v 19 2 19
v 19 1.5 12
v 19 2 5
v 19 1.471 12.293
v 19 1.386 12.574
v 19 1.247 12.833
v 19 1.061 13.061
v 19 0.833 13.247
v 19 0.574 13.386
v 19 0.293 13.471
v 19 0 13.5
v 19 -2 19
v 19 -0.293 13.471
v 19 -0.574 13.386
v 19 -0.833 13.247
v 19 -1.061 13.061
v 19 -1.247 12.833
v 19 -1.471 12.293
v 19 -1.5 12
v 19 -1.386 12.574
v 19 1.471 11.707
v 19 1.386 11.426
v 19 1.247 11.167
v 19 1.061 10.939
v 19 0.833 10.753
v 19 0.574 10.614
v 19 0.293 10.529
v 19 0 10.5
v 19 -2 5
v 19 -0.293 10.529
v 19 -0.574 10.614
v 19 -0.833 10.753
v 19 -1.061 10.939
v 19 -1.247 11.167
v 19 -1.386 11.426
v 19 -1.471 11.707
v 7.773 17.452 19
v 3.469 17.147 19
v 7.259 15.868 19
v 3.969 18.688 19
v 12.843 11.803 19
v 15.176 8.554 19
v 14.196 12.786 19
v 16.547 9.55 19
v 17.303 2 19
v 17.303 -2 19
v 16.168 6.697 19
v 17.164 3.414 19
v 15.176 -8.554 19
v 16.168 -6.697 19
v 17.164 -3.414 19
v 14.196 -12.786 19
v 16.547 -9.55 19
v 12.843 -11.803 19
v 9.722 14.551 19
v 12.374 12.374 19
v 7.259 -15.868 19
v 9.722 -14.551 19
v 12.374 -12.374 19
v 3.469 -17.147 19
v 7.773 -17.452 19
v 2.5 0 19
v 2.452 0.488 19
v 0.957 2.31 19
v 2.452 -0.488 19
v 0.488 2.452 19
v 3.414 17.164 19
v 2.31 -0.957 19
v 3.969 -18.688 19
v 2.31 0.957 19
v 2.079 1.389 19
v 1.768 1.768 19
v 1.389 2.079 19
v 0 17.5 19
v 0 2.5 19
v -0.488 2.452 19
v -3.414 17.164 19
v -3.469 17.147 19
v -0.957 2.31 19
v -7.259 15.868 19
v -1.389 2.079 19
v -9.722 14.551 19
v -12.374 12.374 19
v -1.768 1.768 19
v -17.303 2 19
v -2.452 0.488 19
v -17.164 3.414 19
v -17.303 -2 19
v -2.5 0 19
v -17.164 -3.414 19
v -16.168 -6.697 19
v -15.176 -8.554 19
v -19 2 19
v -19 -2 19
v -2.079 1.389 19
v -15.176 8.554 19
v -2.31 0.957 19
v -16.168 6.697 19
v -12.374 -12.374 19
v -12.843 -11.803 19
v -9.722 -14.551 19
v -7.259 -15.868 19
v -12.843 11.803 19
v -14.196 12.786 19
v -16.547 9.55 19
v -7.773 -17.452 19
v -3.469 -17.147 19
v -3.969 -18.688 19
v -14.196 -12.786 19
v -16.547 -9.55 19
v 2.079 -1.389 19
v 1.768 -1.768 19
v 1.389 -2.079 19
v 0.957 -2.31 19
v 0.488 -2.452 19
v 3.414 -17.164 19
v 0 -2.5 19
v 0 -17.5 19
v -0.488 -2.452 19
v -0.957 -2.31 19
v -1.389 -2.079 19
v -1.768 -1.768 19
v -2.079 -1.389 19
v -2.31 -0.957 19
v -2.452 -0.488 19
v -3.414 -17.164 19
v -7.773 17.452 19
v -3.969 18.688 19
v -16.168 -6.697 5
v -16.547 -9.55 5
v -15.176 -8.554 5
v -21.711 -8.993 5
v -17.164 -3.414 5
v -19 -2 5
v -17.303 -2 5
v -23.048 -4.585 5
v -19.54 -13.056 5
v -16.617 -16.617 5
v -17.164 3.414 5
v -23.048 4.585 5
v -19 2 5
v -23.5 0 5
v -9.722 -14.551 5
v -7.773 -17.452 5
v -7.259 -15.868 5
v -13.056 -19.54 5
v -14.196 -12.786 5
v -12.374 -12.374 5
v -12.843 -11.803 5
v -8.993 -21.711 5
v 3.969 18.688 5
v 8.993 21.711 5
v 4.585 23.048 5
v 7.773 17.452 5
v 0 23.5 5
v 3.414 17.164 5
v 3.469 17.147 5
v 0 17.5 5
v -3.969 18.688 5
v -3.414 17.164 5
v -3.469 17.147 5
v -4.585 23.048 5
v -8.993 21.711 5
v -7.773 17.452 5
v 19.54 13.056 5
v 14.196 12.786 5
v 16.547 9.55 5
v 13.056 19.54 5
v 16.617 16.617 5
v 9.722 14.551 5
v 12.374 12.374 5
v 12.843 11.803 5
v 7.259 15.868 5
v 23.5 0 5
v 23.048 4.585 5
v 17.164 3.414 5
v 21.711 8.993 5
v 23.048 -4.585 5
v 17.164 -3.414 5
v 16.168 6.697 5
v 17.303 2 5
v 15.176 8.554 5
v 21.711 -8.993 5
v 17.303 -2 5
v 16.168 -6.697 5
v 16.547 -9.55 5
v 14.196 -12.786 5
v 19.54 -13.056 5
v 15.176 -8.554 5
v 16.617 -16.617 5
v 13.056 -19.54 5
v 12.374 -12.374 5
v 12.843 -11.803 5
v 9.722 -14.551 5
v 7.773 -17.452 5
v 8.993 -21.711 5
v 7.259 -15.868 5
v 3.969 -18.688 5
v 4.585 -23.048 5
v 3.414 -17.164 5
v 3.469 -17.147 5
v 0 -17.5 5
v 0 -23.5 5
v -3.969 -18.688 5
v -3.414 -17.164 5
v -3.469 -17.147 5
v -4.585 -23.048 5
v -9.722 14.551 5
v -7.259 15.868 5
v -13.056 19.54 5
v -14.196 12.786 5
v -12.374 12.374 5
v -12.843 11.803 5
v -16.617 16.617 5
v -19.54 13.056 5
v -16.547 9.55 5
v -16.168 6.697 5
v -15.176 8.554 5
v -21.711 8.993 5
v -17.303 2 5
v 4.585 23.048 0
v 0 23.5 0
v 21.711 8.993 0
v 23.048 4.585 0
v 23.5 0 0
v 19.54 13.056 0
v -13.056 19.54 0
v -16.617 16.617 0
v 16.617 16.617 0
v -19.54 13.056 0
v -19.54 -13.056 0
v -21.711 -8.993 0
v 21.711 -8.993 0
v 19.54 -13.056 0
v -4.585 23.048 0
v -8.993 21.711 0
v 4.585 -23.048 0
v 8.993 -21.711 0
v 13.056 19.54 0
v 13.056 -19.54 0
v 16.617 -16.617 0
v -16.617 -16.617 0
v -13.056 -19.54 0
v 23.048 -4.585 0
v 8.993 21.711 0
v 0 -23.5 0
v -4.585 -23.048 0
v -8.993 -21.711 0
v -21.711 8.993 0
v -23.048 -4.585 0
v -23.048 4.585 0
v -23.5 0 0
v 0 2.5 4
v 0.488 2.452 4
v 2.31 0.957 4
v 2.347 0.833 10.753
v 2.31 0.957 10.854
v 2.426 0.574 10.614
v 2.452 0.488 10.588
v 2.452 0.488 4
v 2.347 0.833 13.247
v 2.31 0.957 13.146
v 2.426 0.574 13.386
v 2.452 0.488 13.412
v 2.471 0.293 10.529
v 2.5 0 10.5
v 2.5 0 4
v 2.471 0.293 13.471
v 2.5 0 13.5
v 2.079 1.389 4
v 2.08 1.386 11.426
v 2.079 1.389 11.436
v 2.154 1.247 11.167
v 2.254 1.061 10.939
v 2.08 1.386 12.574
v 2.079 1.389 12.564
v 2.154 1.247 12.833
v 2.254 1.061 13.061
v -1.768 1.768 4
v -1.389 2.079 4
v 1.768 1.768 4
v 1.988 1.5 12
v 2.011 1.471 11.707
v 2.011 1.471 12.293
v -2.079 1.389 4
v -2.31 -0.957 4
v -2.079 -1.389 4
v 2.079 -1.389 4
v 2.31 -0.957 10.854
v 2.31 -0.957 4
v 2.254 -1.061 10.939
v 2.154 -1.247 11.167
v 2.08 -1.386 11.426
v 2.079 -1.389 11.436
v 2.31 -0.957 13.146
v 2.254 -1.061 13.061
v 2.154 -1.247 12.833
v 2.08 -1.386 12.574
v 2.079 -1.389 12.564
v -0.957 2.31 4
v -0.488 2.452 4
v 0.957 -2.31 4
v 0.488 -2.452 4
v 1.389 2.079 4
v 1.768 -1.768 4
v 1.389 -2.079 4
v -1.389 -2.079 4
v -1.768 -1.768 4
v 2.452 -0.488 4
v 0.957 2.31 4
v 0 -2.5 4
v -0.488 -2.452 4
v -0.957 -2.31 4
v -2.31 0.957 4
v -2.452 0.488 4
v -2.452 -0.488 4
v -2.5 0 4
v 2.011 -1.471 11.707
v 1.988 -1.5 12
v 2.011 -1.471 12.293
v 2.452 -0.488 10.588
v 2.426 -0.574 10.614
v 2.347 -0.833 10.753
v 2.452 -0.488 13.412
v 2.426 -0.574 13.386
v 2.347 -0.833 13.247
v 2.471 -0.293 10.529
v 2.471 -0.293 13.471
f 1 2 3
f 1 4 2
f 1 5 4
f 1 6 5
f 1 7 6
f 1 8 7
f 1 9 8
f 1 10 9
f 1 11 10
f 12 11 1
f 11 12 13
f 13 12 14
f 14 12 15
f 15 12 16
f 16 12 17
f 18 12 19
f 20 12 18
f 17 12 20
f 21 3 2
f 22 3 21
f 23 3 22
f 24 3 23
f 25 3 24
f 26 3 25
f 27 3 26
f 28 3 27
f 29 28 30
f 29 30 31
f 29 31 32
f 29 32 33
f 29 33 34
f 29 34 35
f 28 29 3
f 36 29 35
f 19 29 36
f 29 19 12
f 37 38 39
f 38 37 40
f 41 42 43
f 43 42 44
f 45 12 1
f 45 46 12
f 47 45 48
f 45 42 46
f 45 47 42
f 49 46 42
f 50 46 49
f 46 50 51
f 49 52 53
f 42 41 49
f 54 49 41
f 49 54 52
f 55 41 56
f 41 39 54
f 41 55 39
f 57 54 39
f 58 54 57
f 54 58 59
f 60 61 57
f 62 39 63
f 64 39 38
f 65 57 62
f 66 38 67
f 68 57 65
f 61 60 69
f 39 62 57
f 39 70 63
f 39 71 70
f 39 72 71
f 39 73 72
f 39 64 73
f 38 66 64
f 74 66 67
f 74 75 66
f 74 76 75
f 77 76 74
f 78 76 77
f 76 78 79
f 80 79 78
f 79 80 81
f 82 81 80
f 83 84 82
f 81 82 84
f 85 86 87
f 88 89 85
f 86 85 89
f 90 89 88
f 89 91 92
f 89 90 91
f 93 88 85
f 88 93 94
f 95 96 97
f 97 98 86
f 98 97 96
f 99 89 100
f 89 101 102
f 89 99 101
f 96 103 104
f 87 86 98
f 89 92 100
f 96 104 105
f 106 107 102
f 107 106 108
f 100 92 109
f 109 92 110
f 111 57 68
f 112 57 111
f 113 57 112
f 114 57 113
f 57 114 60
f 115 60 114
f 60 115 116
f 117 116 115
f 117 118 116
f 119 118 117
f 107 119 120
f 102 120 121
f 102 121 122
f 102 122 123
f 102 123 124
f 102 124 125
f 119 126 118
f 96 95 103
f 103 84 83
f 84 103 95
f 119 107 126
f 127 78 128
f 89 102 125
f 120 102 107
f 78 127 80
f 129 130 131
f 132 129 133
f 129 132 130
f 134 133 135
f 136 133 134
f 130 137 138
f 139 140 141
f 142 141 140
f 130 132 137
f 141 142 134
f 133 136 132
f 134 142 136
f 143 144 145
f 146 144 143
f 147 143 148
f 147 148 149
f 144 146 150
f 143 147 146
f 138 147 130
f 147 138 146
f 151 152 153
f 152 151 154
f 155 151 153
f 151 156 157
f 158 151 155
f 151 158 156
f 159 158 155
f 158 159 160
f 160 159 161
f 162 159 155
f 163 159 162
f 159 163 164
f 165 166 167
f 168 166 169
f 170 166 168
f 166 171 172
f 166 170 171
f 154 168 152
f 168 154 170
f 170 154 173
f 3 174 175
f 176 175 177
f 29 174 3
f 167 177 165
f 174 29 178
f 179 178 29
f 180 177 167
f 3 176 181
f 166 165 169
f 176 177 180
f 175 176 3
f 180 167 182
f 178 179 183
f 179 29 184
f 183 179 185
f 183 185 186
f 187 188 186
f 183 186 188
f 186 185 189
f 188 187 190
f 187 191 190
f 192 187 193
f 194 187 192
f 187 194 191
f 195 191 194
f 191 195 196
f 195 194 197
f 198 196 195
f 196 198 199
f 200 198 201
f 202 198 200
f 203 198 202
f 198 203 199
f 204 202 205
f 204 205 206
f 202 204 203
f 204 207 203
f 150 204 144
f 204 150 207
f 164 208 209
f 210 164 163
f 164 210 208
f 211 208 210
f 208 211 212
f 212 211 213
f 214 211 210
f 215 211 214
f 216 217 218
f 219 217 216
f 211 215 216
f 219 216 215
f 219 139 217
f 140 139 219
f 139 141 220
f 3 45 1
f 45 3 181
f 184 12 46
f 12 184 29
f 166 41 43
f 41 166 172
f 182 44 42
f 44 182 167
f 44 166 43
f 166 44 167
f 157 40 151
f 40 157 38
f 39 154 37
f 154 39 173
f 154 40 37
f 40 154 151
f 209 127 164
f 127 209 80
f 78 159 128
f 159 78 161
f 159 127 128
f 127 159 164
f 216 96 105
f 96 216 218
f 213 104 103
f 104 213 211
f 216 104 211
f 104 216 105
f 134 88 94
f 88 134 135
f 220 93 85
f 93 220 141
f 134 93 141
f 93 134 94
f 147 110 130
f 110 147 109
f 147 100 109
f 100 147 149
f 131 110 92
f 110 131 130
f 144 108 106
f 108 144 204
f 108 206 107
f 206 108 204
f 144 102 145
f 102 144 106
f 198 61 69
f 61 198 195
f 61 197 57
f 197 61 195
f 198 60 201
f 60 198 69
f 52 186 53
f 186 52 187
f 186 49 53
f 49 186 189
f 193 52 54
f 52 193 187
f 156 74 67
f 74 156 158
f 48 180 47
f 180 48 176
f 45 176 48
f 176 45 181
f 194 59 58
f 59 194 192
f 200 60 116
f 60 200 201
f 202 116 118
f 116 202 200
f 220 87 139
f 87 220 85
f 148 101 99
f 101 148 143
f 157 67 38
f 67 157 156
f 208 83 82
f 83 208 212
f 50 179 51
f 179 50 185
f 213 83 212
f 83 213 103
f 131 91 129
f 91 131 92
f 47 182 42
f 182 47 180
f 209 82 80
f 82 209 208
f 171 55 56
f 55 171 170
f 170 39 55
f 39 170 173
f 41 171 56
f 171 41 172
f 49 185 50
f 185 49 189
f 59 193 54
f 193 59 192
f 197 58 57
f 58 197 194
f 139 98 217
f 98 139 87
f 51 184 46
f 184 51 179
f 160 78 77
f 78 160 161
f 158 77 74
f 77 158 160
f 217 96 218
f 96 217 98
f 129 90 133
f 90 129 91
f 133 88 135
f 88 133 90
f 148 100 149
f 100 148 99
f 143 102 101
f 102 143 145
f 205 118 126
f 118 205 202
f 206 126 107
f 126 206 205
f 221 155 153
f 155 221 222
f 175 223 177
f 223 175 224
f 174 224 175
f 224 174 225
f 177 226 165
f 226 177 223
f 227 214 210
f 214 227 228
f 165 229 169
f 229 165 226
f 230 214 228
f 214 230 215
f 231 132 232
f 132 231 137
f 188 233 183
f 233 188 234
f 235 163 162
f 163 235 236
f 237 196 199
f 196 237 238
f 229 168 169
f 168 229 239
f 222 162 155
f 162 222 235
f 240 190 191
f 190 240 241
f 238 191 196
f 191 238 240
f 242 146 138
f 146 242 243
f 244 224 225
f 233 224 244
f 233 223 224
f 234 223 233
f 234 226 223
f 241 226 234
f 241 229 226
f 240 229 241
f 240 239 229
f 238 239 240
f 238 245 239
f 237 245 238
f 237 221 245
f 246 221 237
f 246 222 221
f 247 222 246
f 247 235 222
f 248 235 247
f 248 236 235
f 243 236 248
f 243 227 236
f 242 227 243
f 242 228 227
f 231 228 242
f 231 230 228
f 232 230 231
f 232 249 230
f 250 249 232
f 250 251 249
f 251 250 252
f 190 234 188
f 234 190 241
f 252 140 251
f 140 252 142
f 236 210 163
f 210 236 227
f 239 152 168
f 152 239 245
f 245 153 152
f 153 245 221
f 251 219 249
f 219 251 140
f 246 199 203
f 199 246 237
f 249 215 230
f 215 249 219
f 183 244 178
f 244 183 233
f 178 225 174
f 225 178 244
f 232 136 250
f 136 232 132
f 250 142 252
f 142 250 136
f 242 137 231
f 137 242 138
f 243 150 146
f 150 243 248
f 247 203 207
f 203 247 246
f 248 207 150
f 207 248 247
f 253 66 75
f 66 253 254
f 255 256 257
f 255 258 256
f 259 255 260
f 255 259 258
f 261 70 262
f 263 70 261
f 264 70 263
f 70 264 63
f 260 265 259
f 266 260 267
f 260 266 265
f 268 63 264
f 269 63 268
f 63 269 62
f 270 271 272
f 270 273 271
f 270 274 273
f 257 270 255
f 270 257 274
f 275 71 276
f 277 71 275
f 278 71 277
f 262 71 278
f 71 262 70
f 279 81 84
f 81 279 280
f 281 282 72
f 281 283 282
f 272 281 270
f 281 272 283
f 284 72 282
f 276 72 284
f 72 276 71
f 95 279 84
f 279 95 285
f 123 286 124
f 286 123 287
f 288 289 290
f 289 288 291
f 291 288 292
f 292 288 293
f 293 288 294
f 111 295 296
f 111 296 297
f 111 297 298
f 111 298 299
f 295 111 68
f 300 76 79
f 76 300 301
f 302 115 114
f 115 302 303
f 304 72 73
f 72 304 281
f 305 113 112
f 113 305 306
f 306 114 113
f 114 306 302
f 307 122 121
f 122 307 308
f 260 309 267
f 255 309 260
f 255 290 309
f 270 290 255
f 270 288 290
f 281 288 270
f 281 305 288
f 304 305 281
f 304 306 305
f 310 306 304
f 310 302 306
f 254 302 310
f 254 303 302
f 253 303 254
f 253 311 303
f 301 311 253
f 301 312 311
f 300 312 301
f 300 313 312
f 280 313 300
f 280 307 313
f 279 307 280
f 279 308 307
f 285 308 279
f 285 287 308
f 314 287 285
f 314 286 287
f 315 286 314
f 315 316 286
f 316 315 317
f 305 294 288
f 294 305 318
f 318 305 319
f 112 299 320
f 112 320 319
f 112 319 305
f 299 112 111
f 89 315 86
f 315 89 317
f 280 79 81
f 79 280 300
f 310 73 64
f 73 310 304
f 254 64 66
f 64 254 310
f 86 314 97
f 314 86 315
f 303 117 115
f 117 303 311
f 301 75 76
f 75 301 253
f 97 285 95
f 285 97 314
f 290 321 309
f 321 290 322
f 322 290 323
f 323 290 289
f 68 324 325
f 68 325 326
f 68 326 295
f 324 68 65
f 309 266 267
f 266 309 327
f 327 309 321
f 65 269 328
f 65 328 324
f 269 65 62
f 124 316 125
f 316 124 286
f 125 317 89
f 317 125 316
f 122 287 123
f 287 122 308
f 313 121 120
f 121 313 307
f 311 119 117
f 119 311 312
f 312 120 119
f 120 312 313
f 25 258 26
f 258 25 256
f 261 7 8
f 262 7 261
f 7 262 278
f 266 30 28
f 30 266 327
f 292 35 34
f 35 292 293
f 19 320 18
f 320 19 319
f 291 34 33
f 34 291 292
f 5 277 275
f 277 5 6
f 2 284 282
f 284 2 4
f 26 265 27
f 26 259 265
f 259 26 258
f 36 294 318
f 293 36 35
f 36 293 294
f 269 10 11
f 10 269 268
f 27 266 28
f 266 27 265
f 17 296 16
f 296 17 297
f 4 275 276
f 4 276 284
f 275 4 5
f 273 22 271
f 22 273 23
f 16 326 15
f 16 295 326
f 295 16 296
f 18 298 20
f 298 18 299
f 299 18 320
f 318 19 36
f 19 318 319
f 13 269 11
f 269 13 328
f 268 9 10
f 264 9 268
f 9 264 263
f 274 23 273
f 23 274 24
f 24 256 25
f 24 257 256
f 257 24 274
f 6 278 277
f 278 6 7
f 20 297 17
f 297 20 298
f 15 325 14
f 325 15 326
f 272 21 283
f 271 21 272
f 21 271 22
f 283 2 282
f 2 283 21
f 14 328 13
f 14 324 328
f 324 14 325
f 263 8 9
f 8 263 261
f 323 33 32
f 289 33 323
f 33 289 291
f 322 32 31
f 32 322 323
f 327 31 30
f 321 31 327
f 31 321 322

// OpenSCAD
$fn = 32;

// ----------------------------------------------------------------------
// Control knob: skirt knob with grip ribs
// ----------------------------------------------------------------------

// --- parameters (mm) ---
skirt_d = 47;             // skirt diameter
skirt_t = 5;              // skirt thickness
rib_w = 4;                // grip rib width
rib_out = 2.5;            // grip rib radial protrusion
n_ribs = 10;              // number of grip ribs
knob_d = 35;              // knob body diameter
knob_h = 14;              // knob body height
bore_d = 5;               // shaft bore diameter
set_d = 3;                // set screw bore diameter

rib_step = 360 / n_ribs;  // rib angular step
total_h = skirt_t + knob_h;  // overall height

difference() {
  union() {
    translate([0, 0, skirt_t]) cylinder(h = knob_h, d = knob_d);
    cylinder(h = skirt_t, d = skirt_d);
    for (i = [0 : n_ribs - 1])
      rotate([0, 0, i * rib_step])
        translate([knob_d / 2 - 1, -rib_w / 2, skirt_t])
          cube([rib_out, rib_w, knob_h]);
  }
  translate([0, 0, skirt_t - 1]) cylinder(h = knob_h + 2, d = bore_d);
  translate([-1, 0, skirt_t + knob_h / 2]) rotate([0, 90, 0])
    cylinder(h = knob_d / 2 + bore_d / 2 + 2, d = set_d);
}
